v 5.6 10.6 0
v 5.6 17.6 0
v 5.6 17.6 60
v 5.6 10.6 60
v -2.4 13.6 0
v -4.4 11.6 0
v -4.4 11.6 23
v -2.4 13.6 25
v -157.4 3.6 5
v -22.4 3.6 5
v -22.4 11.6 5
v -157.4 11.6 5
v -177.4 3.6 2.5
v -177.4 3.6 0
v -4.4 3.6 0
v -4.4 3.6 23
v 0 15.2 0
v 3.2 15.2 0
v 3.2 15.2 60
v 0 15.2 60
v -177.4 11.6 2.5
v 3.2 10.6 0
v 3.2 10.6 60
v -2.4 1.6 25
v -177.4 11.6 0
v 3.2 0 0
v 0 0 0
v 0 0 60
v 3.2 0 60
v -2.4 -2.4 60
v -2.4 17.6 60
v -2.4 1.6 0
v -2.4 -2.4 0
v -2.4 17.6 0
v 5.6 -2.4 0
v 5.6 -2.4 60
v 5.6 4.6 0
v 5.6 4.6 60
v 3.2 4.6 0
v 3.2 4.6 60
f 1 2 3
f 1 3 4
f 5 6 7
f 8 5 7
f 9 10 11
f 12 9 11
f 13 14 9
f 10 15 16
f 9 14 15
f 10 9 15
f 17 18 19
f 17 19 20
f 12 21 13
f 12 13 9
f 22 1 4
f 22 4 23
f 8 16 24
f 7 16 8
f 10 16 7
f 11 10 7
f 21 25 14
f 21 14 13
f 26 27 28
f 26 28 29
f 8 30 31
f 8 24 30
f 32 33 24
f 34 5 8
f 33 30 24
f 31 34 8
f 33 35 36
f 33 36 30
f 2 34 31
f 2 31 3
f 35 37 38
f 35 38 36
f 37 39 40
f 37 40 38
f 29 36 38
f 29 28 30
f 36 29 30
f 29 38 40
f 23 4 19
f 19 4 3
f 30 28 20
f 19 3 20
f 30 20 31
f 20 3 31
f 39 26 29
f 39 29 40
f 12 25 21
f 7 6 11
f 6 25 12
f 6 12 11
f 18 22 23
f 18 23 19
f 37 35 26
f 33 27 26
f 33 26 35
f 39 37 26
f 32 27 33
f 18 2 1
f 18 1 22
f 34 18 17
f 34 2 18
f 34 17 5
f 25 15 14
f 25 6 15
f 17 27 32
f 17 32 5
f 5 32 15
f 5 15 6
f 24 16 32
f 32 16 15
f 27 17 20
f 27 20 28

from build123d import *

# Parameters (mm, degrees)
EXTRUDE_1_DEPTH     = 60
SKETCH_2_W          = 5
SKETCH_2_H          = 8
EXTRUDE_2_DEPTH     = 175
CHAMFER_1_SIZE      = 20
CUT_EXTRUDE_1_DEPTH = 33.8
CHAMFER_2_SIZE      = 2


with BuildPart() as part:
    # 草图1 → 凸台-拉伸1 (new body)
    with BuildSketch(Plane.XY):
        Polygon((5.6, 10.6), (3.2, 10.6), (3.2, 15.2), (0, 15.2), (0, 0), (3.2, 0), (3.2, 4.6), (5.6, 4.6), (5.6, -2.4), (-2.4, -2.4), (-2.4, 17.6), (5.6, 17.6), align=None)
    extrude(amount=EXTRUDE_1_DEPTH)

    # 草图2 → 凸台-拉伸2 (add)
    with BuildSketch(Plane.ZY.offset(2.4)):
        with Locations((2.5, 7.6)):
            Rectangle(SKETCH_2_W, SKETCH_2_H)
    extrude(amount=EXTRUDE_2_DEPTH)

    # 倒角1
    chamfer_1_edges = [part.edges().sort_by_distance(p)[0] for p in [
        (-2.4, 7.6, 5),
    ]]
    chamfer(chamfer_1_edges, length=CHAMFER_1_SIZE)

    # 草图3 → 切除-拉伸1 (cut)
    with BuildSketch(Plane(origin=(0, 11.6, 0), x_dir=(1, 0, 0), z_dir=(0, 1, 0))):
        Polygon((-177.4, -2.5), (-157.4, -5), (-177.4, -5), align=None)
    extrude(amount=-CUT_EXTRUDE_1_DEPTH, mode=Mode.SUBTRACT)

    # 倒角2
    chamfer_2_edges = [part.edges().sort_by_distance(p)[0] for p in [
        (-2.4, 3.6, 12.5),
        (-2.4, 11.6, 12.5),
    ]]
    chamfer(chamfer_2_edges, length=CHAMFER_2_SIZE)


solid = part.part
